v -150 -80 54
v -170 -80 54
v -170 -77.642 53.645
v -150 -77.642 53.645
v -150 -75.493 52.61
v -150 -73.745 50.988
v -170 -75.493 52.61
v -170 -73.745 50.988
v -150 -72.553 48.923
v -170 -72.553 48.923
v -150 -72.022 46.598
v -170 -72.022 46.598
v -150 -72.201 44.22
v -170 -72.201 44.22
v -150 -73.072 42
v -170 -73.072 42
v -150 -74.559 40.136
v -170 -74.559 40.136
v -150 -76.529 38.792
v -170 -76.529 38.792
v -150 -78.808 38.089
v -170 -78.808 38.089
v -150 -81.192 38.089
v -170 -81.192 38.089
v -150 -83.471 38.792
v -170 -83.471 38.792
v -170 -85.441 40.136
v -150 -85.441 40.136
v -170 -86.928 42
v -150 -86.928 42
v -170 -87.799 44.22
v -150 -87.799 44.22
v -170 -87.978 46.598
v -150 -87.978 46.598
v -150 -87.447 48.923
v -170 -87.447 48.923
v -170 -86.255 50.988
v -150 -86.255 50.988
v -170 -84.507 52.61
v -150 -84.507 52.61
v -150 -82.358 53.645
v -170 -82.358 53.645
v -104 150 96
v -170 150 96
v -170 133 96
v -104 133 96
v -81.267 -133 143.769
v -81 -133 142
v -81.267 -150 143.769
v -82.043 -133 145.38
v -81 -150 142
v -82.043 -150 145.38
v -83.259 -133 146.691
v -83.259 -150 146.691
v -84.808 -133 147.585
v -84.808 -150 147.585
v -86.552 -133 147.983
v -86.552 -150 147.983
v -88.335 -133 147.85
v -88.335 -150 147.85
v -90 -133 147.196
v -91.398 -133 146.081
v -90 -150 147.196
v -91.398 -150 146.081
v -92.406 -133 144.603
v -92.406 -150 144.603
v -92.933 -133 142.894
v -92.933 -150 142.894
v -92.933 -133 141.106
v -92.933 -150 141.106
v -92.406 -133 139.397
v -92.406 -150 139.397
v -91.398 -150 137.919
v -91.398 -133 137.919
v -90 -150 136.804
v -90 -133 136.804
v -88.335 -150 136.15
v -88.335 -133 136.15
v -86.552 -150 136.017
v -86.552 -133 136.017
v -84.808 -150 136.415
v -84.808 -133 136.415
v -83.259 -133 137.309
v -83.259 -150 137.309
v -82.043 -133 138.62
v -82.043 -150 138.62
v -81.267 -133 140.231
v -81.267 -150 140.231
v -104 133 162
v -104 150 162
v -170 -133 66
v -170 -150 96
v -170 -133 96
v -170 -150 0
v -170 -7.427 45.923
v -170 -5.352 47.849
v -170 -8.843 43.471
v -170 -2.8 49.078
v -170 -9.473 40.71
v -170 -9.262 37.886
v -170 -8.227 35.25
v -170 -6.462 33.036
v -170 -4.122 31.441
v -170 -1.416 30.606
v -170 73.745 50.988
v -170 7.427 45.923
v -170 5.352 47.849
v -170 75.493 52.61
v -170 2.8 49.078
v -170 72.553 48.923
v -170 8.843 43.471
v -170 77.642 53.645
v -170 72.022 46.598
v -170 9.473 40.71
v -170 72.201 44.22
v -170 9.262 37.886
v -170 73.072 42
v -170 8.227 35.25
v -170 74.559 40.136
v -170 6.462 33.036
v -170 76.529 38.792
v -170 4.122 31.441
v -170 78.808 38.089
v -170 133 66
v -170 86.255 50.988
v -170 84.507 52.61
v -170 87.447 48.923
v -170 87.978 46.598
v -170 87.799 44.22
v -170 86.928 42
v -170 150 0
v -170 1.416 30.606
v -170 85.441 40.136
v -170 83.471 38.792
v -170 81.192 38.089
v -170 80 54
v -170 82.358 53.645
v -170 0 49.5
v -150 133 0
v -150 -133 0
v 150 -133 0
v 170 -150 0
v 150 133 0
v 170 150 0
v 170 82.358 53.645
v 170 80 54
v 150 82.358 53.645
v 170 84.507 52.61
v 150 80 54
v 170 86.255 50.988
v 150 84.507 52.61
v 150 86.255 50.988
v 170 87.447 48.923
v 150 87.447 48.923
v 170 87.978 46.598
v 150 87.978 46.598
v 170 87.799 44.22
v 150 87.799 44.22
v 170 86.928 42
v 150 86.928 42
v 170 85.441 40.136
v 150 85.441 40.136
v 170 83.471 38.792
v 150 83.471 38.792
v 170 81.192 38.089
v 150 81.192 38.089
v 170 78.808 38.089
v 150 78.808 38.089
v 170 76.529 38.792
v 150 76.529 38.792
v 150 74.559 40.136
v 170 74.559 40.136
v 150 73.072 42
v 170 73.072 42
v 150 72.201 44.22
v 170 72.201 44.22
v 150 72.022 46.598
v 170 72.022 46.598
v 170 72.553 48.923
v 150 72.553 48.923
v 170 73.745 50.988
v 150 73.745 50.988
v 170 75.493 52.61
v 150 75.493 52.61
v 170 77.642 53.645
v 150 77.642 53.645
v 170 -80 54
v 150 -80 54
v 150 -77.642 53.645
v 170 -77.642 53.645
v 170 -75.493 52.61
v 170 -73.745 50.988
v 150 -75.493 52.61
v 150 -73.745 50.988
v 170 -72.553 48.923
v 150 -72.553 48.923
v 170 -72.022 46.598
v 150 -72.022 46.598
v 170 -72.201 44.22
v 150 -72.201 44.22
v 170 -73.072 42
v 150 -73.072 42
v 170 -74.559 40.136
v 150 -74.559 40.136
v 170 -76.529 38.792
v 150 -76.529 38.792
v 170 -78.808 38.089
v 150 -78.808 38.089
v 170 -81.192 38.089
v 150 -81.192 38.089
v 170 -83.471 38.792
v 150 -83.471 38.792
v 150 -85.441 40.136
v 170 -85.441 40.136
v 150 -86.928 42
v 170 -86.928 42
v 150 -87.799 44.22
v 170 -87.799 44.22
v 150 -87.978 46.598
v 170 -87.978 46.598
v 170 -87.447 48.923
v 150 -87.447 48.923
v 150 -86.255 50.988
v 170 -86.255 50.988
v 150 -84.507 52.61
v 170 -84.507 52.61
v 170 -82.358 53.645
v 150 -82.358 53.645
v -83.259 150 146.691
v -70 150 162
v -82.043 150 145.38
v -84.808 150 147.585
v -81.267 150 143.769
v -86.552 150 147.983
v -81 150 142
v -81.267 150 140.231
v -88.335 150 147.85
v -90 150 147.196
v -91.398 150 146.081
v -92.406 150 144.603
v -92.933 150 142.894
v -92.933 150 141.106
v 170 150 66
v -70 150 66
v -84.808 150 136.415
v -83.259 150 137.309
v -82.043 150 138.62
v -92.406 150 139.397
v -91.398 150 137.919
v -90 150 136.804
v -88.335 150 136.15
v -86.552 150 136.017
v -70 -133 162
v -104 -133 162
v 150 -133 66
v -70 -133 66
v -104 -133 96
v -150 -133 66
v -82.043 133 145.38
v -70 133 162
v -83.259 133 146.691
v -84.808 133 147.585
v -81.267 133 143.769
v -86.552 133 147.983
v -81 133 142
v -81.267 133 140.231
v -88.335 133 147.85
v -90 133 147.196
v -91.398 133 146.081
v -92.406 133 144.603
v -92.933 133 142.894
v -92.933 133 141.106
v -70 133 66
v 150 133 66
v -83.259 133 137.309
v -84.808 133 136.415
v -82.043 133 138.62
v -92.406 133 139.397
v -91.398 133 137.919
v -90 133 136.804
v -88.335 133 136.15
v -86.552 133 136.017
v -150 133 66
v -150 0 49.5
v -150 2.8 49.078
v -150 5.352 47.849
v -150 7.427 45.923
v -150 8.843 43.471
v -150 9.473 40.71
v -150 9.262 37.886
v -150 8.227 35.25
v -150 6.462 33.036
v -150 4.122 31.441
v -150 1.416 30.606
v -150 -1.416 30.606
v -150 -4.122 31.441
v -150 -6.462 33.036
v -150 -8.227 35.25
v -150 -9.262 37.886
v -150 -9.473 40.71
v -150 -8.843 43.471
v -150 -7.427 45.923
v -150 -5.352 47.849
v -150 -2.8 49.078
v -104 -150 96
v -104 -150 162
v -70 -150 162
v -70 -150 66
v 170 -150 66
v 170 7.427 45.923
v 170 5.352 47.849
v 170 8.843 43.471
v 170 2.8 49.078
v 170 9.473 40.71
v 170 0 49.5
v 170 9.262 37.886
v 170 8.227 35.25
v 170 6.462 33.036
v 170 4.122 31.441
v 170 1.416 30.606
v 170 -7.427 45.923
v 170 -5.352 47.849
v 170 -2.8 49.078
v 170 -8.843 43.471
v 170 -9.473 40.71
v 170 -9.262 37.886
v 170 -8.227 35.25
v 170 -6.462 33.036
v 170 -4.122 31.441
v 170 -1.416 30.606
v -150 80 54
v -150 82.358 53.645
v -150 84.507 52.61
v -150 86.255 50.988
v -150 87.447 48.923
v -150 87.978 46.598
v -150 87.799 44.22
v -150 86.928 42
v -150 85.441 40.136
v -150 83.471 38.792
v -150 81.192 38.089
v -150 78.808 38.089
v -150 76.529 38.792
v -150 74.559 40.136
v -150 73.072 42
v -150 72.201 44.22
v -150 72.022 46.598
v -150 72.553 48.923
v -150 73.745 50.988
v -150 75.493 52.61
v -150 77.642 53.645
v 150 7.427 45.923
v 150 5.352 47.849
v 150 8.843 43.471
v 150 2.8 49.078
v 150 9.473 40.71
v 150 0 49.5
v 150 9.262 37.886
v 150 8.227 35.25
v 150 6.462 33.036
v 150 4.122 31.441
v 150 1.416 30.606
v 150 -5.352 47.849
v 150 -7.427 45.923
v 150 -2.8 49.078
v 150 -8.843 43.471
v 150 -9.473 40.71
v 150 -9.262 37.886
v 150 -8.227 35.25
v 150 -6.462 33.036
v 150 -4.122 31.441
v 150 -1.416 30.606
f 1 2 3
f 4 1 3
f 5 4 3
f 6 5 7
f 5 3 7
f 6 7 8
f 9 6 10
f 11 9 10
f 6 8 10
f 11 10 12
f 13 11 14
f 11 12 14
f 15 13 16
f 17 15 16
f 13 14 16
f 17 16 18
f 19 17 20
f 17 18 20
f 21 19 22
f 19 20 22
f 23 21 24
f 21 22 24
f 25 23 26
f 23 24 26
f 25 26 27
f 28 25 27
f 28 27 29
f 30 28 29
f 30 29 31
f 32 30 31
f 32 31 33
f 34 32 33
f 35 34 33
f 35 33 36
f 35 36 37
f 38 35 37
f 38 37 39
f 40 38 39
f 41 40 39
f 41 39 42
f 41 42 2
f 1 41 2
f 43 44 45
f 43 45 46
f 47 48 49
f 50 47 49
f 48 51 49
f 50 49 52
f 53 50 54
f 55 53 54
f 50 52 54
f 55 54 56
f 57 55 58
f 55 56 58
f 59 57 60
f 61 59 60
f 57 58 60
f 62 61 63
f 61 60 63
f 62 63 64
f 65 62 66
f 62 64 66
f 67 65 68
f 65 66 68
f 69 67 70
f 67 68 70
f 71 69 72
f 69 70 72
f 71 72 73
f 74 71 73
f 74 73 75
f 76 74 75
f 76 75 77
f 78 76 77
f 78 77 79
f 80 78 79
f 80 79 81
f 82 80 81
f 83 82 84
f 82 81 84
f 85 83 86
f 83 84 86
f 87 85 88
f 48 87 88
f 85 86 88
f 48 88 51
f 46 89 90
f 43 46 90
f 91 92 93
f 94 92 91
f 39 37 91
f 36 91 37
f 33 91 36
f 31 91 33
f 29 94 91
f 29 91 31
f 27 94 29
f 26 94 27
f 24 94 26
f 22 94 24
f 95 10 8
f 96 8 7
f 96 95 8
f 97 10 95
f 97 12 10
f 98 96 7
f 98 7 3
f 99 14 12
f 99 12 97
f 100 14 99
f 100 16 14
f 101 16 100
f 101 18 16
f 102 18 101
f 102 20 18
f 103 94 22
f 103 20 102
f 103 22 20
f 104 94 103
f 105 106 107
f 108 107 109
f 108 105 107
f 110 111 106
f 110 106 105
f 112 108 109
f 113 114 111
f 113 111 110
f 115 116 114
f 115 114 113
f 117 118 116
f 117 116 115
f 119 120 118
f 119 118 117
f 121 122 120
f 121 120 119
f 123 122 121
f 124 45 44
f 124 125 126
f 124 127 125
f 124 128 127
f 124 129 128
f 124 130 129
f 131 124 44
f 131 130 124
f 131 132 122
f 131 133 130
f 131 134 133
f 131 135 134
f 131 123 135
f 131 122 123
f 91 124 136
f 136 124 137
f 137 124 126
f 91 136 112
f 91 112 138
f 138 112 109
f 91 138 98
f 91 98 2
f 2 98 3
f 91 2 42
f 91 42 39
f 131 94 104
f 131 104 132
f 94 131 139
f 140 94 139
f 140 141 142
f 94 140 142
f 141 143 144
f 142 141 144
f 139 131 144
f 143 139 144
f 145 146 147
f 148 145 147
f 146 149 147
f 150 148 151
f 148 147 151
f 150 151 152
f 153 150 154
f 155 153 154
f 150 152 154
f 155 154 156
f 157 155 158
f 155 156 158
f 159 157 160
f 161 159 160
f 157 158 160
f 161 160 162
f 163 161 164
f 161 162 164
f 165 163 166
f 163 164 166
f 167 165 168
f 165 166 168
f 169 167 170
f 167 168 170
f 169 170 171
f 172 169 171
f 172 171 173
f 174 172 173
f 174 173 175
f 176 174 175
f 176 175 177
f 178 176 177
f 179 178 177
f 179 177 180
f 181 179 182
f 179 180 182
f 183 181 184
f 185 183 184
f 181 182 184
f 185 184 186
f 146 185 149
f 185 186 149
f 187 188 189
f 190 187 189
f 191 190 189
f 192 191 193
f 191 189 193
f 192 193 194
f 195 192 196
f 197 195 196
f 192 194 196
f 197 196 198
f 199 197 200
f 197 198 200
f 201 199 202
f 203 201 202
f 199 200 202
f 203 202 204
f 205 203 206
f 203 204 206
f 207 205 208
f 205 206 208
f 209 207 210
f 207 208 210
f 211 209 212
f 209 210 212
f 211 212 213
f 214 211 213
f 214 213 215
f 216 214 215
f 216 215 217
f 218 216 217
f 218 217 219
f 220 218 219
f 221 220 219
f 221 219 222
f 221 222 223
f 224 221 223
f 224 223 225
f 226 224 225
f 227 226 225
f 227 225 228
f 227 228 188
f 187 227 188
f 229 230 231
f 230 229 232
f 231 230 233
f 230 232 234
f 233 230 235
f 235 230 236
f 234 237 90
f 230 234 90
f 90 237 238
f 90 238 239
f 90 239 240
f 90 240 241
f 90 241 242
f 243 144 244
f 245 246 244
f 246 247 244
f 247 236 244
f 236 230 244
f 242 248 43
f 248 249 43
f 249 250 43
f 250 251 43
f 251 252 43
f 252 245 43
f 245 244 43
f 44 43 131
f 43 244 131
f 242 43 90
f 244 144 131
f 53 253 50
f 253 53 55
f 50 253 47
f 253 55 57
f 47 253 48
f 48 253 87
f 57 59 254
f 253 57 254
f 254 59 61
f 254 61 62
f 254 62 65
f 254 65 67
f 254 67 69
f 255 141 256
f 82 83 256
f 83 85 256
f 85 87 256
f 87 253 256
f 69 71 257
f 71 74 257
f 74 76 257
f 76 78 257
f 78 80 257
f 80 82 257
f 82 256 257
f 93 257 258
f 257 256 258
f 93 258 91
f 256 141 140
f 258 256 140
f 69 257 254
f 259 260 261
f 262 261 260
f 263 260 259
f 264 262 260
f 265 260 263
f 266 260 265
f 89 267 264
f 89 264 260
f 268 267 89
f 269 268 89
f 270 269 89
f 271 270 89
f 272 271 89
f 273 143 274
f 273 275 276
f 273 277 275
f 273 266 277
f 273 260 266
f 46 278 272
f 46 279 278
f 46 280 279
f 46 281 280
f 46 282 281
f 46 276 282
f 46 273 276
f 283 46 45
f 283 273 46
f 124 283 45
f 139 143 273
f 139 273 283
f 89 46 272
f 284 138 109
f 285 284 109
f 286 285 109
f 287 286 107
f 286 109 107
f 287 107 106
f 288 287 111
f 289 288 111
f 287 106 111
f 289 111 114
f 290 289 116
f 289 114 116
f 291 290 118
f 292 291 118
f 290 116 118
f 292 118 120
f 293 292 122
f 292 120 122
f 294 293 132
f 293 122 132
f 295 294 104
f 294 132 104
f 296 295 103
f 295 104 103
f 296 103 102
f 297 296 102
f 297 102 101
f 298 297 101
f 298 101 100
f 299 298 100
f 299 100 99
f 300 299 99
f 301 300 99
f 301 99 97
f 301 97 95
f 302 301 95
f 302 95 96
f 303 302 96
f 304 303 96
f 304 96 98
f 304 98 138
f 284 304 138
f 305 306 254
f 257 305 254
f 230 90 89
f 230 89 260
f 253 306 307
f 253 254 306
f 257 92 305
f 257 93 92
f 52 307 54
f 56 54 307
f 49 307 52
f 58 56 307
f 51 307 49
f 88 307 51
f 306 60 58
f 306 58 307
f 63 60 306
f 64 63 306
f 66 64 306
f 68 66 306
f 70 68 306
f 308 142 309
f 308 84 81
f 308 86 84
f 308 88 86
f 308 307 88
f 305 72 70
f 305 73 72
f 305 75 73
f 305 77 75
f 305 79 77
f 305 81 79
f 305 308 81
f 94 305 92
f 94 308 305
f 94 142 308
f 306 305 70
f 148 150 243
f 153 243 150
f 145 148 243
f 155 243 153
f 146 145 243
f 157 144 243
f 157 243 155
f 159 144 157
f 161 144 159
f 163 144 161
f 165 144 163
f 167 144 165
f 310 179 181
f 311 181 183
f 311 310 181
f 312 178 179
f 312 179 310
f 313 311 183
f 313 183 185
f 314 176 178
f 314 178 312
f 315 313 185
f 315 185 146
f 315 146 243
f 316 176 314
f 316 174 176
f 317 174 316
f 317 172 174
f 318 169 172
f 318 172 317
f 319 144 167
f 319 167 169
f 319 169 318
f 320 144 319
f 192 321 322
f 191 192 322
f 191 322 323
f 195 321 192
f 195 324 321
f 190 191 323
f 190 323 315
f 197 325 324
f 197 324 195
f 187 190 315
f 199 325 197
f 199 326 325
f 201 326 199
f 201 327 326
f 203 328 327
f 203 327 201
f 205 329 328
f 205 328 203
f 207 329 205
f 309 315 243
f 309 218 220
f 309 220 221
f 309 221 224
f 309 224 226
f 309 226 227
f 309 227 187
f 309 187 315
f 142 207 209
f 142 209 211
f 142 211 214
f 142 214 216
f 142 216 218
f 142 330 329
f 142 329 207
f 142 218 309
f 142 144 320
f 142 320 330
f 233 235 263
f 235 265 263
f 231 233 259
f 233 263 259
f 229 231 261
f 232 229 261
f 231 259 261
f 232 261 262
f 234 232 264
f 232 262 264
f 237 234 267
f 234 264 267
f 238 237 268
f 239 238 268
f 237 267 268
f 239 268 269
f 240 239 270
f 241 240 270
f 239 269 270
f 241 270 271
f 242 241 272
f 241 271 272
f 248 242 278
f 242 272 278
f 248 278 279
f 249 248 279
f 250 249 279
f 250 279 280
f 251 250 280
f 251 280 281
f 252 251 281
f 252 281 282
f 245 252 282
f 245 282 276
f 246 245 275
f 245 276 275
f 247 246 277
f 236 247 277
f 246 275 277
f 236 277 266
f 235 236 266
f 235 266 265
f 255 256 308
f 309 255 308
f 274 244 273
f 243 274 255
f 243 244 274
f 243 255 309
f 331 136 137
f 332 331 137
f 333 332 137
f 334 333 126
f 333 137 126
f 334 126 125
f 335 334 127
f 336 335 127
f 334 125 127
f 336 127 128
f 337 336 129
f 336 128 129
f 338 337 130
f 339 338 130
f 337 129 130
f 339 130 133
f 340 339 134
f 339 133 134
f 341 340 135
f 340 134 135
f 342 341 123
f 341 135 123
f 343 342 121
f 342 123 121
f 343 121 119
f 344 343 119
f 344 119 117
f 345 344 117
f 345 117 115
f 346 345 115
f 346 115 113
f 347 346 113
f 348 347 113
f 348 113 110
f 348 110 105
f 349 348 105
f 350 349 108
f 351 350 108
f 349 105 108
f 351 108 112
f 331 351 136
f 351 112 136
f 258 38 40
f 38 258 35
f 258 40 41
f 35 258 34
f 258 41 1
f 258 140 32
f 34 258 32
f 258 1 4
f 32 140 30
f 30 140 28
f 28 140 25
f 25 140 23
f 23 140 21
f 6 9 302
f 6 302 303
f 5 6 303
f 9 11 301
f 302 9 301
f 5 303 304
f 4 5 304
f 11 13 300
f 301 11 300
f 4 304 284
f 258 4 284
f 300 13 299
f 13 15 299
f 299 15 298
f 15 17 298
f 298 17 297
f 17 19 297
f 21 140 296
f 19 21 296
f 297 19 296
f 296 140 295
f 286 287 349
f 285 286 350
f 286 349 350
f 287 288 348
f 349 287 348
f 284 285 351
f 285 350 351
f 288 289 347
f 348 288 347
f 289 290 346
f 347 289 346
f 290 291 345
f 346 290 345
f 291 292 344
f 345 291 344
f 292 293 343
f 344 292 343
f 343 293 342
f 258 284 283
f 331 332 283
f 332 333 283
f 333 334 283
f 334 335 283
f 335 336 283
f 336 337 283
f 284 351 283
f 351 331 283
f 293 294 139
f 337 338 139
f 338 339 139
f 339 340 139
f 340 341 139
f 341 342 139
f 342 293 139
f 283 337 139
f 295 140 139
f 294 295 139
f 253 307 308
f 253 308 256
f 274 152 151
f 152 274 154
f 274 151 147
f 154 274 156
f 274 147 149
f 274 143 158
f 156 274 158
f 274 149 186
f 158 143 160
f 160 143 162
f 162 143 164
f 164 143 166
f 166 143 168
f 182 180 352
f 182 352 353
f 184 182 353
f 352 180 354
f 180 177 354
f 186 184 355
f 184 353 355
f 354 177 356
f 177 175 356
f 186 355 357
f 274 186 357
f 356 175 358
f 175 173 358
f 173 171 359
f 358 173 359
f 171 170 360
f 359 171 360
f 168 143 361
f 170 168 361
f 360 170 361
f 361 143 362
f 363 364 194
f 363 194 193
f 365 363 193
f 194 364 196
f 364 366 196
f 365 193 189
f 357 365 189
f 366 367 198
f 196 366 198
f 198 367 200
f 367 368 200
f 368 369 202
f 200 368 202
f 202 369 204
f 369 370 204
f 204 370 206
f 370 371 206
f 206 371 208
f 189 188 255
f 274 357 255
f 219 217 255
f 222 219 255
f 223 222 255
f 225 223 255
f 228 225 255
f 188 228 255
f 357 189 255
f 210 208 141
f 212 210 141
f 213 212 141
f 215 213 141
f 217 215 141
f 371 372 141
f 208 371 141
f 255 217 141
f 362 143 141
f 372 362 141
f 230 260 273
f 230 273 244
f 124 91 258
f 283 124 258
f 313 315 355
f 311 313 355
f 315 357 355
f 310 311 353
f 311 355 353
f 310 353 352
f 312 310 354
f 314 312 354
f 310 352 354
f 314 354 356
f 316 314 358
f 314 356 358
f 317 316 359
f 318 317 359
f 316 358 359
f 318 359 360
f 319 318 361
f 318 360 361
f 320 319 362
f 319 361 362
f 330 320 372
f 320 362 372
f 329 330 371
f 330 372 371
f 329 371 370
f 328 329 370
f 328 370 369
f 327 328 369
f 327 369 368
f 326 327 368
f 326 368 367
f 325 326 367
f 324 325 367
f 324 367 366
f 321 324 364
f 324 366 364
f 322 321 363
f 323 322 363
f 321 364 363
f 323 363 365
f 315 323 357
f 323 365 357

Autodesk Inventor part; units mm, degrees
sketch "Sketch1" plane through (0, 0, 0) normal (0, 0, 1) x (1, 0, 0)
  line L0 (150, -133) -> (-150, -133)
  line L1 (-150, -133) -> (-150, 133)
  line L2 (-150, 133) -> (150, 133)
  line L3 (150, 133) -> (150, -133)
  line L4 (0, 0) -> (0, 56.2774)
  line L5 (0, 0) -> (78.3407, 0)
  line L6 (170, -150) -> (-170, -150)
  line L7 (-170, -150) -> (-170, 150)
  line L8 (-170, 150) -> (170, 150)
  line L9 (170, 150) -> (170, -150)
  point P0 (0, 133)
  point P1 (150, 0)
  dimension "d0" = 300
  dimension "d1" = 266
  dimension "d2" = 17
  dimension "d3" = 17
  dimension "d4" = 20
  dimension "d5" = 20
extrude "Extrusion1" add sketch "Sketch1" along normal blind 66
sketch "Sketch2" plane through (-170, -150, 0) normal (-1, 0, 0) x (0, 0, 1)
  circle A0 centre (46, 230) radius 8 projected
  circle A1 centre (46, 70) radius 8 projected
  circle A2 centre (46, 230) radius 8
  circle A3 centre (46, 70) radius 8
  circle A4 centre (40, 150) radius 9.5 projected
  circle A5 centre (40, 150) radius 9.5
  point P0 (0, 150)
extrude "Extrusion2" cut sketch "Sketch2" against normal through all
sketch "Sketch4" plane through (0, 0, 66) normal (0, 0, 1) x (1, 0, 0)
  line L0 (150, -133) -> (-150, -133) projected
  line L1 (170, 150) -> (-170, 150) projected
  line L2 (-170, 150) -> (-170, -150) projected
  line L3 (-70, -150) -> (-170, -150)
  line L4 (-170, -150) -> (-170, -133)
  line L5 (-170, -133) -> (-70, -133)
  line L6 (-70, -133) -> (-70, -150)
  line L7 (-70, 133) -> (-170, 133)
  line L8 (-170, 133) -> (-170, 150)
  line L9 (-170, 150) -> (-70, 150)
  line L10 (-70, 150) -> (-70, 133)
  point P0 (0, 0)
  dimension "d14" = 100
  dimension "d15" = 17
  dimension "d17" = 100
  dimension "d18" = 17
extrude "Extrusion3" add sketch "Sketch4" along normal blind 30
ref_plane "Work Plane1" through (-87, -150, 162) normal (0, 0, 1) x (1, 0, 0)
ref_plane "Work Plane2" through (-87, 133, 162) normal (0, 0, 1) x (1, 0, 0)
ref_plane "Work Plane3" through (-87, -150, 162) normal (0, 0, 1) x (1, 0, 0)
sketch "Sketch9" plane through (0, 0, 96) normal (0, 0, 1) x (1, 0, 0)
  line L0 (-70, 133) -> (-70, 150) projected
  line L1 (-70, 150) -> (-170, 150) projected
  line L2 (-104, 133) -> (-104, 150) projected
  line L3 (-70, 133) -> (-104, 133)
  line L4 (-104, 133) -> (-104, 150)
  line L5 (-104, 150) -> (-70, 150)
  line L6 (-70, 150) -> (-70, 133)
  point P0 (0, 0)
ref_plane "Work Plane4" through (-157, 133, 162) normal (0, 0, 1) x (1, 0, 0)
extrude "Extrusion8" add sketch "Sketch9" along normal up to surface (66 mm away)
sketch "Sketch10" plane through (0, 0, 96) normal (0, 0, 1) x (1, 0, 0)
  line L0 (-70, -150) -> (-70, -133) projected
  line L1 (-70, -133) -> (-170, -133) projected
  line L2 (-104, -150) -> (-104, -133) projected
  line L3 (-70, -150) -> (-104, -150)
  line L4 (-104, -150) -> (-104, -133)
  line L5 (-104, -133) -> (-70, -133)
  line L6 (-70, -133) -> (-70, -150)
  point P0 (0, 0)
ref_plane "Work Plane5" through (-157, -150, 162) normal (0, 0, 1) x (1, 0, 0)
extrude "Extrusion9" add sketch "Sketch10" along normal up to surface (66 mm away)
sketch "Sketch11" plane through (-170, -150, 0) normal (0, -1, 0) x (1, 0, 0)
  circle A0 centre (83, 142) radius 6
  point P0 (170, 0)
extrude "Extrusion10" cut sketch "Sketch11" against normal through all
sketch "Sketch12" plane through (0, 0, 0) normal (0, 1, 0) x (-1, 0, 0)
  point P0 (0, 0)
properties part number "Base" material "Wood (Birch)"
